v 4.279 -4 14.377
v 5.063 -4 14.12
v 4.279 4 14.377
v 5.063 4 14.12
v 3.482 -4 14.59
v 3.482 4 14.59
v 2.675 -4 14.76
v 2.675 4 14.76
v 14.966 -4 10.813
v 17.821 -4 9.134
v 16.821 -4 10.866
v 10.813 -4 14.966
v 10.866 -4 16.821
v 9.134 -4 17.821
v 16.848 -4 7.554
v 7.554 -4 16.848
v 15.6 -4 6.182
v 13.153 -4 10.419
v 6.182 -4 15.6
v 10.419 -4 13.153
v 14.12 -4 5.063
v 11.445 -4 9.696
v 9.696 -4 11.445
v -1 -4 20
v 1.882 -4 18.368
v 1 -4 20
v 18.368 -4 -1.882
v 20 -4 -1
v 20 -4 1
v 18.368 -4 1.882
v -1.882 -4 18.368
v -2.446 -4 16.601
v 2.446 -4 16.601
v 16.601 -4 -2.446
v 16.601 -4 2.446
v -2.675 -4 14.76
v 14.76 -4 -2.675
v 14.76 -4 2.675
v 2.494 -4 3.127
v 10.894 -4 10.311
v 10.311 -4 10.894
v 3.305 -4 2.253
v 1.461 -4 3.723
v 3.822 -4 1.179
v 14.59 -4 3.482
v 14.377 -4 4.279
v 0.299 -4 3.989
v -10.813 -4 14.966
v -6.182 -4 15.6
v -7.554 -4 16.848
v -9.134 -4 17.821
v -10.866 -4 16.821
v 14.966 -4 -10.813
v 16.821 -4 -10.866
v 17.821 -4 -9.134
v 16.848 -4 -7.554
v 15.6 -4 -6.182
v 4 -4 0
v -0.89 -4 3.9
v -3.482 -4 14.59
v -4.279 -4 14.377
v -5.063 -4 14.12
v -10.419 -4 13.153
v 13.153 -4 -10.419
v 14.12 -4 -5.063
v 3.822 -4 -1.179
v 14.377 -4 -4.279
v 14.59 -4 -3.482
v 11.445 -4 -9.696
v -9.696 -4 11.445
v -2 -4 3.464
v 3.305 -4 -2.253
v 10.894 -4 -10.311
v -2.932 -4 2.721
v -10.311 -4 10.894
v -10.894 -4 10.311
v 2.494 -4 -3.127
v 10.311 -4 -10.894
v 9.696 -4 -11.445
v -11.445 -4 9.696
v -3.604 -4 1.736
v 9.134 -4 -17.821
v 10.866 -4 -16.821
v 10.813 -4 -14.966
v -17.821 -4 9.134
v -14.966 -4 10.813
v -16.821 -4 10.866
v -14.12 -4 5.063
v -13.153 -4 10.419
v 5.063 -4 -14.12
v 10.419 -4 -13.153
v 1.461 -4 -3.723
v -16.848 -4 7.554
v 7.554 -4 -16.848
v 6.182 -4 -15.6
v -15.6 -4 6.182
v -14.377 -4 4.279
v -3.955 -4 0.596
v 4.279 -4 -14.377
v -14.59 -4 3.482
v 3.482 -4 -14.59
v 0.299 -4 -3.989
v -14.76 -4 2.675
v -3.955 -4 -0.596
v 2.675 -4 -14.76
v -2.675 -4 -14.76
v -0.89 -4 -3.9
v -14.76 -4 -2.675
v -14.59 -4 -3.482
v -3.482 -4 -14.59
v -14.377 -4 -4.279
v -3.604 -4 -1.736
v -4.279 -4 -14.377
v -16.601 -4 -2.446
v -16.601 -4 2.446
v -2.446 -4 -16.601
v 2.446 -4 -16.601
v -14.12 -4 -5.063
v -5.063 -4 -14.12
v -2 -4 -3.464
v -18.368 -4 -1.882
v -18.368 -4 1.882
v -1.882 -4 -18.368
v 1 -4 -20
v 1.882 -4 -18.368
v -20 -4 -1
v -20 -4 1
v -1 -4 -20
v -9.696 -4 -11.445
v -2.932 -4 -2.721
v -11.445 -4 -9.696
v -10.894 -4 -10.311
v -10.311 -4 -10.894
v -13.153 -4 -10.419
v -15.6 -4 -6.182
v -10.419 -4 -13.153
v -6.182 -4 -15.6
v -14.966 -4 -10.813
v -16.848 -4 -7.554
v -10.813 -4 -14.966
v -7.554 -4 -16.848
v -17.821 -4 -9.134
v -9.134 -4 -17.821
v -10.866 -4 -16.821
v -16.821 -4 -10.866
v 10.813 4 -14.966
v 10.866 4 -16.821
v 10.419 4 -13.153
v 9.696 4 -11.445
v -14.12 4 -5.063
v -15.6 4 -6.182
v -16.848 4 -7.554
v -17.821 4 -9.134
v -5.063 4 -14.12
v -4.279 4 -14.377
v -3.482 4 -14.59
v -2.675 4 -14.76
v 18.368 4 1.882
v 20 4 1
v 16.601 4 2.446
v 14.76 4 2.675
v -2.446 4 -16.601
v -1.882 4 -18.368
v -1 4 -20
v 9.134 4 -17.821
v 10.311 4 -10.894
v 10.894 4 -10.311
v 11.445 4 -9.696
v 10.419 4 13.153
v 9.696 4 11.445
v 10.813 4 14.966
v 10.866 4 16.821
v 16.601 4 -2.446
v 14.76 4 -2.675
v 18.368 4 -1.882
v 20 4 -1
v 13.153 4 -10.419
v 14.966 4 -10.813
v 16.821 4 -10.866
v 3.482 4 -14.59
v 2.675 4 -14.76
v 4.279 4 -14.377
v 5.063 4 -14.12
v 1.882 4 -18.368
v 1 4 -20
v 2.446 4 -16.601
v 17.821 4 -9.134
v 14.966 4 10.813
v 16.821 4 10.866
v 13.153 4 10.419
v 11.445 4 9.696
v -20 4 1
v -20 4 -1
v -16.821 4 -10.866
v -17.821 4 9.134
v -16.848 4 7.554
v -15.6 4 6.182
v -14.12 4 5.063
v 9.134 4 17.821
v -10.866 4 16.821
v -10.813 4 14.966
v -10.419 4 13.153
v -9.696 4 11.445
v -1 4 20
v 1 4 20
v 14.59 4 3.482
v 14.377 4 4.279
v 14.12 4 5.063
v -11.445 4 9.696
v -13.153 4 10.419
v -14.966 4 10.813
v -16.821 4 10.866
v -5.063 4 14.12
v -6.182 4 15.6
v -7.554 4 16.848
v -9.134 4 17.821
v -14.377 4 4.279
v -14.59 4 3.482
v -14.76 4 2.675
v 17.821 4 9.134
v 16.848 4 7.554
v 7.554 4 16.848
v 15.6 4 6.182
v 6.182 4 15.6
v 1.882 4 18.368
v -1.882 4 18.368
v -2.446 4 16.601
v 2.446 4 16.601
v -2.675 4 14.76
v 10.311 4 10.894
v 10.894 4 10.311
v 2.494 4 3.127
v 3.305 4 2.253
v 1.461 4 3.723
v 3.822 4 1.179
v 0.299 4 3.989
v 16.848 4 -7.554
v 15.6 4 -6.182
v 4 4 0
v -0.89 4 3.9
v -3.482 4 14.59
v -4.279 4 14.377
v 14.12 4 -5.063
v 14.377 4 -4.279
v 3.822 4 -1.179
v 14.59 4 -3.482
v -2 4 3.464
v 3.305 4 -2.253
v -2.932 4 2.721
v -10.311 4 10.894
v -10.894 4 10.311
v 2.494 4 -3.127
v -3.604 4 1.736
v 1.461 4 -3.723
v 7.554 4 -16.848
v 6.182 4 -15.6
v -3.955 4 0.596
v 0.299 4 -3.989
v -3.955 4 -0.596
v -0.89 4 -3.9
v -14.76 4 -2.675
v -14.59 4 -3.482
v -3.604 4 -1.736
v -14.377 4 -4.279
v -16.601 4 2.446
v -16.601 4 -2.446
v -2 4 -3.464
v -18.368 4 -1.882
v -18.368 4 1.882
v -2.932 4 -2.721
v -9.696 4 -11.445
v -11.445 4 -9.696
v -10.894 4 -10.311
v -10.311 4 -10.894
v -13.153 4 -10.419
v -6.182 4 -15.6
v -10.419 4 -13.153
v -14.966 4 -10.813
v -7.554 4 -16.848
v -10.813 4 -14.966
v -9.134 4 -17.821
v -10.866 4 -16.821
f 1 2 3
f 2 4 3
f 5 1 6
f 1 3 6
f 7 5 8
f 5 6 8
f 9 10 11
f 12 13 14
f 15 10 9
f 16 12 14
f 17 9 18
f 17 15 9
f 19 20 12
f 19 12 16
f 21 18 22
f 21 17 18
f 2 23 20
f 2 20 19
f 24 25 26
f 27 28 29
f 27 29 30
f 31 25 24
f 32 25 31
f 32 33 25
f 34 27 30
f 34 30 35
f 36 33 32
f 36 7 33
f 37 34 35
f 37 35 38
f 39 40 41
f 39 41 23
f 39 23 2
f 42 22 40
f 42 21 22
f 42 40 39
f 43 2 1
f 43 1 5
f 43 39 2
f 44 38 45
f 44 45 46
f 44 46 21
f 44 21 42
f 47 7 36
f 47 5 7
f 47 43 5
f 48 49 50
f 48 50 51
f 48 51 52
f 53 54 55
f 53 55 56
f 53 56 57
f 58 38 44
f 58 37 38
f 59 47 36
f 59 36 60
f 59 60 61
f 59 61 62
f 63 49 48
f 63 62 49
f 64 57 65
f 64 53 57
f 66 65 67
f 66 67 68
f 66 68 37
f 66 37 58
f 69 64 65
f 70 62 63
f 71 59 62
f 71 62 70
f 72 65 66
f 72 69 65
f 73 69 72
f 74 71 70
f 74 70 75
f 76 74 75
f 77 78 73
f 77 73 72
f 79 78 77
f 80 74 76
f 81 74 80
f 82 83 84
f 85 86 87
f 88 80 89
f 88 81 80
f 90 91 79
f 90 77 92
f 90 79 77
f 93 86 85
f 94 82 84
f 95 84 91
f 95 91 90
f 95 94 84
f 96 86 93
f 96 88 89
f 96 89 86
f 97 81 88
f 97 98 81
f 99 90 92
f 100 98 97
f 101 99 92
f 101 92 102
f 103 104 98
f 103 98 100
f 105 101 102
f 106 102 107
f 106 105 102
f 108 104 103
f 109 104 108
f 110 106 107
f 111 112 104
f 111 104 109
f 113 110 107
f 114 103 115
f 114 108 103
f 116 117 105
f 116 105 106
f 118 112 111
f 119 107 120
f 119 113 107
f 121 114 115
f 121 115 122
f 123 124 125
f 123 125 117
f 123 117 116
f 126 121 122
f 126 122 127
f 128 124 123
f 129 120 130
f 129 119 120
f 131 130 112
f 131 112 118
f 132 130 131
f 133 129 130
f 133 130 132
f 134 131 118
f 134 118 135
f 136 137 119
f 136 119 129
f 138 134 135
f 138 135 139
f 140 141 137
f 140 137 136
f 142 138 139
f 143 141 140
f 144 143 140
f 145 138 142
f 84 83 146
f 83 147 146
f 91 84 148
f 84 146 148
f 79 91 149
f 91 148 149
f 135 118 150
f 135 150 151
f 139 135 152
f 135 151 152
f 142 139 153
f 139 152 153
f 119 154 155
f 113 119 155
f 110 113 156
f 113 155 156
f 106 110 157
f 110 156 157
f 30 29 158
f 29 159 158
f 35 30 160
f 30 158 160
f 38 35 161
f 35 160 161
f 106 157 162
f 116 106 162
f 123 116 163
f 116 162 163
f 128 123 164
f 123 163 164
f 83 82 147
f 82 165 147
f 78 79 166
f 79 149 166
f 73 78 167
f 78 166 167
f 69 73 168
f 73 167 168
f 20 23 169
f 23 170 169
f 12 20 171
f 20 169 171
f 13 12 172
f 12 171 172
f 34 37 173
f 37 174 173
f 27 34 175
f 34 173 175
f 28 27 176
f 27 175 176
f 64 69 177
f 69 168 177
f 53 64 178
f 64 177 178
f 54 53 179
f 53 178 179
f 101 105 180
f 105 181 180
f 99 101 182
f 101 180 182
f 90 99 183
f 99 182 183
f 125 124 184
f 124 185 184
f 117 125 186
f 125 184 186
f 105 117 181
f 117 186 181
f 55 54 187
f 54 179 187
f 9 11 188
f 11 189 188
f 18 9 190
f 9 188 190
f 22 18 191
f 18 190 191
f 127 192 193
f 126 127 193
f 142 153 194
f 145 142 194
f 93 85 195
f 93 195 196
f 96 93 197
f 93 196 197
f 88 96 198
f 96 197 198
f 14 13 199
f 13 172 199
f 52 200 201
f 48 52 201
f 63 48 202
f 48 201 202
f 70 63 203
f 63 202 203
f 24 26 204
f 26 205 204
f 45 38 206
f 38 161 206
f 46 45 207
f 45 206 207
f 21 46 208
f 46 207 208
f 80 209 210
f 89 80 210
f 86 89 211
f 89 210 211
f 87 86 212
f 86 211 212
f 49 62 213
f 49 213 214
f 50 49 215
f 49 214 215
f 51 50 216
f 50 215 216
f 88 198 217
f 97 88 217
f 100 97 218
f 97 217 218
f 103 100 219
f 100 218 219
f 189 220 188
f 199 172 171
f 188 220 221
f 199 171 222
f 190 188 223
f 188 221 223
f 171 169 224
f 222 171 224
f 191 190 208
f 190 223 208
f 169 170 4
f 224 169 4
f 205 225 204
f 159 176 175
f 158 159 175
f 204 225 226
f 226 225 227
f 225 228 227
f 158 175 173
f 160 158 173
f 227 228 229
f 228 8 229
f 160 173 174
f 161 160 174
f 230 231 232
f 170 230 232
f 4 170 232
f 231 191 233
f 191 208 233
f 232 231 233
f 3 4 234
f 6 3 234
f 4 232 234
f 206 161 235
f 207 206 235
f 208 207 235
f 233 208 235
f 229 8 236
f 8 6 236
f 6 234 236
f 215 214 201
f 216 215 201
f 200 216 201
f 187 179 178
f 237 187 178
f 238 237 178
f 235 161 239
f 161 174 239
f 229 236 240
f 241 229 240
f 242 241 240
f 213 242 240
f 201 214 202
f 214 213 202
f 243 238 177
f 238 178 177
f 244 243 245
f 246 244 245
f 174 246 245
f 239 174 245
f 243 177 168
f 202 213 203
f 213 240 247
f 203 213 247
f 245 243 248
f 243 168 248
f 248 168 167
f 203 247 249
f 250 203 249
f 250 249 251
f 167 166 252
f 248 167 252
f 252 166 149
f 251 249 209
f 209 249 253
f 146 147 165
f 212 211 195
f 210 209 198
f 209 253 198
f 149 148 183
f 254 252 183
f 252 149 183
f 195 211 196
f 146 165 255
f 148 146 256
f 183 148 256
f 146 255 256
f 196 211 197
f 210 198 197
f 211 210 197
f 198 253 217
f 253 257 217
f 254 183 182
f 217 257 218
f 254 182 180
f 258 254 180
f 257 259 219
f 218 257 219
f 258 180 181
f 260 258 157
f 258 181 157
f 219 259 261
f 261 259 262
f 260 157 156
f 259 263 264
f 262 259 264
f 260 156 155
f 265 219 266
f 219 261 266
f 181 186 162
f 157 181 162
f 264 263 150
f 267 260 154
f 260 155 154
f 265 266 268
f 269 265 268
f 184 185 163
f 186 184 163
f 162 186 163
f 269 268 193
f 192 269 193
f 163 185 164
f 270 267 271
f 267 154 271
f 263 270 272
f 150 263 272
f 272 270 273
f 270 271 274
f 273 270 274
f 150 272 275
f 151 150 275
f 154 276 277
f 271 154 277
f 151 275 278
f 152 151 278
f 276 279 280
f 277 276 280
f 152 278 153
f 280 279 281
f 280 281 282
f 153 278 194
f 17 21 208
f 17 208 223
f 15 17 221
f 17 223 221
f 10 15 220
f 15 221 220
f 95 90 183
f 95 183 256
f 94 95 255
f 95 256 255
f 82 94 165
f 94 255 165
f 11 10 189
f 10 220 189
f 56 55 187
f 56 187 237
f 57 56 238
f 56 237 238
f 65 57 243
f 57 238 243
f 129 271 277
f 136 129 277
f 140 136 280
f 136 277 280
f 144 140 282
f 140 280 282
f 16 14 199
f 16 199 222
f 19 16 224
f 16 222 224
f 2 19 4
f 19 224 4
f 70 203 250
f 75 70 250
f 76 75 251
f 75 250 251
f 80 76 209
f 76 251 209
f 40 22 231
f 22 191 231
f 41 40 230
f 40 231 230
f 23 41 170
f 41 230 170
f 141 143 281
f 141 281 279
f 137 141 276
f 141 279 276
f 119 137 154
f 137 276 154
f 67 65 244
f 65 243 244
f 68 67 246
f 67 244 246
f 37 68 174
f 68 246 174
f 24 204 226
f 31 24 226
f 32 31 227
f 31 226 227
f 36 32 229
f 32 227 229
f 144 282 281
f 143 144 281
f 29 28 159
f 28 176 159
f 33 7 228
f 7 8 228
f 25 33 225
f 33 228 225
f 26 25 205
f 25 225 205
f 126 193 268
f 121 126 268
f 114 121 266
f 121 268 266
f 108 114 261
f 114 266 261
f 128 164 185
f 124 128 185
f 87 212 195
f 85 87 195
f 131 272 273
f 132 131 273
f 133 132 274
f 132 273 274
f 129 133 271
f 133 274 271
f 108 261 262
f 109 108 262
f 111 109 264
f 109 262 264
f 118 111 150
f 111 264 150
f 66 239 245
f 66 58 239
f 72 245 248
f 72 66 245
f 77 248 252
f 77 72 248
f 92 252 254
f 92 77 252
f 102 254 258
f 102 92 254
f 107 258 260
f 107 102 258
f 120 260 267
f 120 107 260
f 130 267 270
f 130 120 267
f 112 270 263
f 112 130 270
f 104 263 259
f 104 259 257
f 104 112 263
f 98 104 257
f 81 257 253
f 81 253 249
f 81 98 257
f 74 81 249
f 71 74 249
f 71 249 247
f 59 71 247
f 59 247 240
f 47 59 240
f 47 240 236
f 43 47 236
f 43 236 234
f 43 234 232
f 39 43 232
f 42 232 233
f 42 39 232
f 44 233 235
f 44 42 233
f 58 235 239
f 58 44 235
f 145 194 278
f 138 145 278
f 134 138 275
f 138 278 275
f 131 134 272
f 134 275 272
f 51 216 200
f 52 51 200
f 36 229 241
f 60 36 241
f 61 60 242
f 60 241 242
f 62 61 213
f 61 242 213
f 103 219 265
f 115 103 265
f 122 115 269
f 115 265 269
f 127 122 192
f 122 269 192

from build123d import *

# Parameters (mm, degrees)
SKETCH1_R           = 4
BOSS_EXTRUDE1_DEPTH = 4


with BuildPart() as part:
    # Sketch1 → Boss-Extrude1 (new body, symmetric)
    with BuildSketch(Plane(origin=(0, 0, 0), x_dir=(1, 0, 0), z_dir=(0, 1, 0))):
        with BuildLine():
            Line((-1, 20), (1, 20))
            ThreePointArc((1, 20), (2.204975942, 17.497232023), (2.675, 14.759551992))
            ThreePointArc((2.675, 14.759551992), (3.882285677, 14.488887394), (5.063158041, 14.119646973))
            ThreePointArc((5.063158041, 14.119646973), (6.839050831, 16.255535399), (9.133974596, 17.820508076))
            Line((9.133974596, 17.820508076), (10.866025404, 16.820508076))
            ThreePointArc((10.866025404, 16.820508076), (10.658181192, 14.050559457), (9.696393951, 11.444646973))
            ThreePointArc((9.696393951, 11.444646973), (10.606601718, 10.606601718), (11.444646973, 9.696393951))
            ThreePointArc((11.444646973, 9.696393951), (14.050559457, 10.658181192), (16.820508076, 10.866025404))
            Line((16.820508076, 10.866025404), (17.820508076, 9.133974596))
            ThreePointArc((17.820508076, 9.133974596), (16.255535399, 6.839050831), (14.119646973, 5.063158041))
            ThreePointArc((14.119646973, 5.063158041), (14.488887394, 3.882285677), (14.759551992, 2.675))
            ThreePointArc((14.759551992, 2.675), (17.497232023, 2.204975942), (20, 1))
            Line((20, 1), (20, -1))
            ThreePointArc((20, -1), (17.497232023, -2.204975942), (14.759551992, -2.675))
            ThreePointArc((14.759551992, -2.675), (14.488887394, -3.882285677), (14.119646973, -5.063158041))
            ThreePointArc((14.119646973, -5.063158041), (16.255535399, -6.839050831), (17.820508076, -9.133974596))
            Line((17.820508076, -9.133974596), (16.820508076, -10.866025404))
            ThreePointArc((16.820508076, -10.866025404), (14.050559457, -10.658181192), (11.444646973, -9.696393951))
            ThreePointArc((11.444646973, -9.696393951), (10.606601718, -10.606601718), (9.696393951, -11.444646973))
            ThreePointArc((9.696393951, -11.444646973), (10.658181192, -14.050559457), (10.866025404, -16.820508076))
            Line((10.866025404, -16.820508076), (9.133974596, -17.820508076))
            ThreePointArc((9.133974596, -17.820508076), (6.839050831, -16.255535399), (5.063158041, -14.119646973))
            ThreePointArc((5.063158041, -14.119646973), (3.882285677, -14.488887394), (2.675, -14.759551992))
            ThreePointArc((2.675, -14.759551992), (2.204975942, -17.497232023), (1, -20))
            Line((1, -20), (-1, -20))
            ThreePointArc((-1, -20), (-2.204975942, -17.497232023), (-2.675, -14.759551992))
            ThreePointArc((-2.675, -14.759551992), (-3.882285677, -14.488887394), (-5.063158041, -14.119646973))
            ThreePointArc((-5.063158041, -14.119646973), (-6.839050831, -16.255535399), (-9.133974596, -17.820508076))
            Line((-9.133974596, -17.820508076), (-10.866025404, -16.820508076))
            ThreePointArc((-10.866025404, -16.820508076), (-10.658181192, -14.050559457), (-9.696393951, -11.444646973))
            ThreePointArc((-9.696393951, -11.444646973), (-10.606601718, -10.606601718), (-11.444646973, -9.696393951))
            ThreePointArc((-11.444646973, -9.696393951), (-14.050559457, -10.658181192), (-16.820508076, -10.866025404))
            Line((-16.820508076, -10.866025404), (-17.820508076, -9.133974596))
            ThreePointArc((-17.820508076, -9.133974596), (-16.255535399, -6.839050831), (-14.119646973, -5.063158041))
            ThreePointArc((-14.119646973, -5.063158041), (-14.488887394, -3.882285677), (-14.759551992, -2.675))
            ThreePointArc((-14.759551992, -2.675), (-17.497232023, -2.204975942), (-20, -1))
            Line((-20, -1), (-20, 1))
            ThreePointArc((-20, 1), (-17.497232023, 2.204975942), (-14.759551992, 2.675))
            ThreePointArc((-14.759551992, 2.675), (-14.488887394, 3.882285677), (-14.119646973, 5.063158041))
            ThreePointArc((-14.119646973, 5.063158041), (-16.255535399, 6.839050831), (-17.820508076, 9.133974596))
            Line((-17.820508076, 9.133974596), (-16.820508076, 10.866025404))
            ThreePointArc((-16.820508076, 10.866025404), (-14.050559457, 10.658181192), (-11.444646973, 9.696393951))
            ThreePointArc((-11.444646973, 9.696393951), (-10.606601718, 10.606601718), (-9.696393951, 11.444646973))
            ThreePointArc((-9.696393951, 11.444646973), (-10.658181192, 14.050559457), (-10.866025404, 16.820508076))
            Line((-10.866025404, 16.820508076), (-9.133974596, 17.820508076))
            ThreePointArc((-9.133974596, 17.820508076), (-6.839050831, 16.255535399), (-5.063158041, 14.119646973))
            ThreePointArc((-5.063158041, 14.119646973), (-3.882285677, 14.488887394), (-2.675, 14.759551992))
            ThreePointArc((-2.675, 14.759551992), (-2.204975942, 17.497232023), (-1, 20))
        make_face()
        Circle(SKETCH1_R, mode=Mode.SUBTRACT)
    extrude(amount=BOSS_EXTRUDE1_DEPTH, both=True)


solid = part.part
